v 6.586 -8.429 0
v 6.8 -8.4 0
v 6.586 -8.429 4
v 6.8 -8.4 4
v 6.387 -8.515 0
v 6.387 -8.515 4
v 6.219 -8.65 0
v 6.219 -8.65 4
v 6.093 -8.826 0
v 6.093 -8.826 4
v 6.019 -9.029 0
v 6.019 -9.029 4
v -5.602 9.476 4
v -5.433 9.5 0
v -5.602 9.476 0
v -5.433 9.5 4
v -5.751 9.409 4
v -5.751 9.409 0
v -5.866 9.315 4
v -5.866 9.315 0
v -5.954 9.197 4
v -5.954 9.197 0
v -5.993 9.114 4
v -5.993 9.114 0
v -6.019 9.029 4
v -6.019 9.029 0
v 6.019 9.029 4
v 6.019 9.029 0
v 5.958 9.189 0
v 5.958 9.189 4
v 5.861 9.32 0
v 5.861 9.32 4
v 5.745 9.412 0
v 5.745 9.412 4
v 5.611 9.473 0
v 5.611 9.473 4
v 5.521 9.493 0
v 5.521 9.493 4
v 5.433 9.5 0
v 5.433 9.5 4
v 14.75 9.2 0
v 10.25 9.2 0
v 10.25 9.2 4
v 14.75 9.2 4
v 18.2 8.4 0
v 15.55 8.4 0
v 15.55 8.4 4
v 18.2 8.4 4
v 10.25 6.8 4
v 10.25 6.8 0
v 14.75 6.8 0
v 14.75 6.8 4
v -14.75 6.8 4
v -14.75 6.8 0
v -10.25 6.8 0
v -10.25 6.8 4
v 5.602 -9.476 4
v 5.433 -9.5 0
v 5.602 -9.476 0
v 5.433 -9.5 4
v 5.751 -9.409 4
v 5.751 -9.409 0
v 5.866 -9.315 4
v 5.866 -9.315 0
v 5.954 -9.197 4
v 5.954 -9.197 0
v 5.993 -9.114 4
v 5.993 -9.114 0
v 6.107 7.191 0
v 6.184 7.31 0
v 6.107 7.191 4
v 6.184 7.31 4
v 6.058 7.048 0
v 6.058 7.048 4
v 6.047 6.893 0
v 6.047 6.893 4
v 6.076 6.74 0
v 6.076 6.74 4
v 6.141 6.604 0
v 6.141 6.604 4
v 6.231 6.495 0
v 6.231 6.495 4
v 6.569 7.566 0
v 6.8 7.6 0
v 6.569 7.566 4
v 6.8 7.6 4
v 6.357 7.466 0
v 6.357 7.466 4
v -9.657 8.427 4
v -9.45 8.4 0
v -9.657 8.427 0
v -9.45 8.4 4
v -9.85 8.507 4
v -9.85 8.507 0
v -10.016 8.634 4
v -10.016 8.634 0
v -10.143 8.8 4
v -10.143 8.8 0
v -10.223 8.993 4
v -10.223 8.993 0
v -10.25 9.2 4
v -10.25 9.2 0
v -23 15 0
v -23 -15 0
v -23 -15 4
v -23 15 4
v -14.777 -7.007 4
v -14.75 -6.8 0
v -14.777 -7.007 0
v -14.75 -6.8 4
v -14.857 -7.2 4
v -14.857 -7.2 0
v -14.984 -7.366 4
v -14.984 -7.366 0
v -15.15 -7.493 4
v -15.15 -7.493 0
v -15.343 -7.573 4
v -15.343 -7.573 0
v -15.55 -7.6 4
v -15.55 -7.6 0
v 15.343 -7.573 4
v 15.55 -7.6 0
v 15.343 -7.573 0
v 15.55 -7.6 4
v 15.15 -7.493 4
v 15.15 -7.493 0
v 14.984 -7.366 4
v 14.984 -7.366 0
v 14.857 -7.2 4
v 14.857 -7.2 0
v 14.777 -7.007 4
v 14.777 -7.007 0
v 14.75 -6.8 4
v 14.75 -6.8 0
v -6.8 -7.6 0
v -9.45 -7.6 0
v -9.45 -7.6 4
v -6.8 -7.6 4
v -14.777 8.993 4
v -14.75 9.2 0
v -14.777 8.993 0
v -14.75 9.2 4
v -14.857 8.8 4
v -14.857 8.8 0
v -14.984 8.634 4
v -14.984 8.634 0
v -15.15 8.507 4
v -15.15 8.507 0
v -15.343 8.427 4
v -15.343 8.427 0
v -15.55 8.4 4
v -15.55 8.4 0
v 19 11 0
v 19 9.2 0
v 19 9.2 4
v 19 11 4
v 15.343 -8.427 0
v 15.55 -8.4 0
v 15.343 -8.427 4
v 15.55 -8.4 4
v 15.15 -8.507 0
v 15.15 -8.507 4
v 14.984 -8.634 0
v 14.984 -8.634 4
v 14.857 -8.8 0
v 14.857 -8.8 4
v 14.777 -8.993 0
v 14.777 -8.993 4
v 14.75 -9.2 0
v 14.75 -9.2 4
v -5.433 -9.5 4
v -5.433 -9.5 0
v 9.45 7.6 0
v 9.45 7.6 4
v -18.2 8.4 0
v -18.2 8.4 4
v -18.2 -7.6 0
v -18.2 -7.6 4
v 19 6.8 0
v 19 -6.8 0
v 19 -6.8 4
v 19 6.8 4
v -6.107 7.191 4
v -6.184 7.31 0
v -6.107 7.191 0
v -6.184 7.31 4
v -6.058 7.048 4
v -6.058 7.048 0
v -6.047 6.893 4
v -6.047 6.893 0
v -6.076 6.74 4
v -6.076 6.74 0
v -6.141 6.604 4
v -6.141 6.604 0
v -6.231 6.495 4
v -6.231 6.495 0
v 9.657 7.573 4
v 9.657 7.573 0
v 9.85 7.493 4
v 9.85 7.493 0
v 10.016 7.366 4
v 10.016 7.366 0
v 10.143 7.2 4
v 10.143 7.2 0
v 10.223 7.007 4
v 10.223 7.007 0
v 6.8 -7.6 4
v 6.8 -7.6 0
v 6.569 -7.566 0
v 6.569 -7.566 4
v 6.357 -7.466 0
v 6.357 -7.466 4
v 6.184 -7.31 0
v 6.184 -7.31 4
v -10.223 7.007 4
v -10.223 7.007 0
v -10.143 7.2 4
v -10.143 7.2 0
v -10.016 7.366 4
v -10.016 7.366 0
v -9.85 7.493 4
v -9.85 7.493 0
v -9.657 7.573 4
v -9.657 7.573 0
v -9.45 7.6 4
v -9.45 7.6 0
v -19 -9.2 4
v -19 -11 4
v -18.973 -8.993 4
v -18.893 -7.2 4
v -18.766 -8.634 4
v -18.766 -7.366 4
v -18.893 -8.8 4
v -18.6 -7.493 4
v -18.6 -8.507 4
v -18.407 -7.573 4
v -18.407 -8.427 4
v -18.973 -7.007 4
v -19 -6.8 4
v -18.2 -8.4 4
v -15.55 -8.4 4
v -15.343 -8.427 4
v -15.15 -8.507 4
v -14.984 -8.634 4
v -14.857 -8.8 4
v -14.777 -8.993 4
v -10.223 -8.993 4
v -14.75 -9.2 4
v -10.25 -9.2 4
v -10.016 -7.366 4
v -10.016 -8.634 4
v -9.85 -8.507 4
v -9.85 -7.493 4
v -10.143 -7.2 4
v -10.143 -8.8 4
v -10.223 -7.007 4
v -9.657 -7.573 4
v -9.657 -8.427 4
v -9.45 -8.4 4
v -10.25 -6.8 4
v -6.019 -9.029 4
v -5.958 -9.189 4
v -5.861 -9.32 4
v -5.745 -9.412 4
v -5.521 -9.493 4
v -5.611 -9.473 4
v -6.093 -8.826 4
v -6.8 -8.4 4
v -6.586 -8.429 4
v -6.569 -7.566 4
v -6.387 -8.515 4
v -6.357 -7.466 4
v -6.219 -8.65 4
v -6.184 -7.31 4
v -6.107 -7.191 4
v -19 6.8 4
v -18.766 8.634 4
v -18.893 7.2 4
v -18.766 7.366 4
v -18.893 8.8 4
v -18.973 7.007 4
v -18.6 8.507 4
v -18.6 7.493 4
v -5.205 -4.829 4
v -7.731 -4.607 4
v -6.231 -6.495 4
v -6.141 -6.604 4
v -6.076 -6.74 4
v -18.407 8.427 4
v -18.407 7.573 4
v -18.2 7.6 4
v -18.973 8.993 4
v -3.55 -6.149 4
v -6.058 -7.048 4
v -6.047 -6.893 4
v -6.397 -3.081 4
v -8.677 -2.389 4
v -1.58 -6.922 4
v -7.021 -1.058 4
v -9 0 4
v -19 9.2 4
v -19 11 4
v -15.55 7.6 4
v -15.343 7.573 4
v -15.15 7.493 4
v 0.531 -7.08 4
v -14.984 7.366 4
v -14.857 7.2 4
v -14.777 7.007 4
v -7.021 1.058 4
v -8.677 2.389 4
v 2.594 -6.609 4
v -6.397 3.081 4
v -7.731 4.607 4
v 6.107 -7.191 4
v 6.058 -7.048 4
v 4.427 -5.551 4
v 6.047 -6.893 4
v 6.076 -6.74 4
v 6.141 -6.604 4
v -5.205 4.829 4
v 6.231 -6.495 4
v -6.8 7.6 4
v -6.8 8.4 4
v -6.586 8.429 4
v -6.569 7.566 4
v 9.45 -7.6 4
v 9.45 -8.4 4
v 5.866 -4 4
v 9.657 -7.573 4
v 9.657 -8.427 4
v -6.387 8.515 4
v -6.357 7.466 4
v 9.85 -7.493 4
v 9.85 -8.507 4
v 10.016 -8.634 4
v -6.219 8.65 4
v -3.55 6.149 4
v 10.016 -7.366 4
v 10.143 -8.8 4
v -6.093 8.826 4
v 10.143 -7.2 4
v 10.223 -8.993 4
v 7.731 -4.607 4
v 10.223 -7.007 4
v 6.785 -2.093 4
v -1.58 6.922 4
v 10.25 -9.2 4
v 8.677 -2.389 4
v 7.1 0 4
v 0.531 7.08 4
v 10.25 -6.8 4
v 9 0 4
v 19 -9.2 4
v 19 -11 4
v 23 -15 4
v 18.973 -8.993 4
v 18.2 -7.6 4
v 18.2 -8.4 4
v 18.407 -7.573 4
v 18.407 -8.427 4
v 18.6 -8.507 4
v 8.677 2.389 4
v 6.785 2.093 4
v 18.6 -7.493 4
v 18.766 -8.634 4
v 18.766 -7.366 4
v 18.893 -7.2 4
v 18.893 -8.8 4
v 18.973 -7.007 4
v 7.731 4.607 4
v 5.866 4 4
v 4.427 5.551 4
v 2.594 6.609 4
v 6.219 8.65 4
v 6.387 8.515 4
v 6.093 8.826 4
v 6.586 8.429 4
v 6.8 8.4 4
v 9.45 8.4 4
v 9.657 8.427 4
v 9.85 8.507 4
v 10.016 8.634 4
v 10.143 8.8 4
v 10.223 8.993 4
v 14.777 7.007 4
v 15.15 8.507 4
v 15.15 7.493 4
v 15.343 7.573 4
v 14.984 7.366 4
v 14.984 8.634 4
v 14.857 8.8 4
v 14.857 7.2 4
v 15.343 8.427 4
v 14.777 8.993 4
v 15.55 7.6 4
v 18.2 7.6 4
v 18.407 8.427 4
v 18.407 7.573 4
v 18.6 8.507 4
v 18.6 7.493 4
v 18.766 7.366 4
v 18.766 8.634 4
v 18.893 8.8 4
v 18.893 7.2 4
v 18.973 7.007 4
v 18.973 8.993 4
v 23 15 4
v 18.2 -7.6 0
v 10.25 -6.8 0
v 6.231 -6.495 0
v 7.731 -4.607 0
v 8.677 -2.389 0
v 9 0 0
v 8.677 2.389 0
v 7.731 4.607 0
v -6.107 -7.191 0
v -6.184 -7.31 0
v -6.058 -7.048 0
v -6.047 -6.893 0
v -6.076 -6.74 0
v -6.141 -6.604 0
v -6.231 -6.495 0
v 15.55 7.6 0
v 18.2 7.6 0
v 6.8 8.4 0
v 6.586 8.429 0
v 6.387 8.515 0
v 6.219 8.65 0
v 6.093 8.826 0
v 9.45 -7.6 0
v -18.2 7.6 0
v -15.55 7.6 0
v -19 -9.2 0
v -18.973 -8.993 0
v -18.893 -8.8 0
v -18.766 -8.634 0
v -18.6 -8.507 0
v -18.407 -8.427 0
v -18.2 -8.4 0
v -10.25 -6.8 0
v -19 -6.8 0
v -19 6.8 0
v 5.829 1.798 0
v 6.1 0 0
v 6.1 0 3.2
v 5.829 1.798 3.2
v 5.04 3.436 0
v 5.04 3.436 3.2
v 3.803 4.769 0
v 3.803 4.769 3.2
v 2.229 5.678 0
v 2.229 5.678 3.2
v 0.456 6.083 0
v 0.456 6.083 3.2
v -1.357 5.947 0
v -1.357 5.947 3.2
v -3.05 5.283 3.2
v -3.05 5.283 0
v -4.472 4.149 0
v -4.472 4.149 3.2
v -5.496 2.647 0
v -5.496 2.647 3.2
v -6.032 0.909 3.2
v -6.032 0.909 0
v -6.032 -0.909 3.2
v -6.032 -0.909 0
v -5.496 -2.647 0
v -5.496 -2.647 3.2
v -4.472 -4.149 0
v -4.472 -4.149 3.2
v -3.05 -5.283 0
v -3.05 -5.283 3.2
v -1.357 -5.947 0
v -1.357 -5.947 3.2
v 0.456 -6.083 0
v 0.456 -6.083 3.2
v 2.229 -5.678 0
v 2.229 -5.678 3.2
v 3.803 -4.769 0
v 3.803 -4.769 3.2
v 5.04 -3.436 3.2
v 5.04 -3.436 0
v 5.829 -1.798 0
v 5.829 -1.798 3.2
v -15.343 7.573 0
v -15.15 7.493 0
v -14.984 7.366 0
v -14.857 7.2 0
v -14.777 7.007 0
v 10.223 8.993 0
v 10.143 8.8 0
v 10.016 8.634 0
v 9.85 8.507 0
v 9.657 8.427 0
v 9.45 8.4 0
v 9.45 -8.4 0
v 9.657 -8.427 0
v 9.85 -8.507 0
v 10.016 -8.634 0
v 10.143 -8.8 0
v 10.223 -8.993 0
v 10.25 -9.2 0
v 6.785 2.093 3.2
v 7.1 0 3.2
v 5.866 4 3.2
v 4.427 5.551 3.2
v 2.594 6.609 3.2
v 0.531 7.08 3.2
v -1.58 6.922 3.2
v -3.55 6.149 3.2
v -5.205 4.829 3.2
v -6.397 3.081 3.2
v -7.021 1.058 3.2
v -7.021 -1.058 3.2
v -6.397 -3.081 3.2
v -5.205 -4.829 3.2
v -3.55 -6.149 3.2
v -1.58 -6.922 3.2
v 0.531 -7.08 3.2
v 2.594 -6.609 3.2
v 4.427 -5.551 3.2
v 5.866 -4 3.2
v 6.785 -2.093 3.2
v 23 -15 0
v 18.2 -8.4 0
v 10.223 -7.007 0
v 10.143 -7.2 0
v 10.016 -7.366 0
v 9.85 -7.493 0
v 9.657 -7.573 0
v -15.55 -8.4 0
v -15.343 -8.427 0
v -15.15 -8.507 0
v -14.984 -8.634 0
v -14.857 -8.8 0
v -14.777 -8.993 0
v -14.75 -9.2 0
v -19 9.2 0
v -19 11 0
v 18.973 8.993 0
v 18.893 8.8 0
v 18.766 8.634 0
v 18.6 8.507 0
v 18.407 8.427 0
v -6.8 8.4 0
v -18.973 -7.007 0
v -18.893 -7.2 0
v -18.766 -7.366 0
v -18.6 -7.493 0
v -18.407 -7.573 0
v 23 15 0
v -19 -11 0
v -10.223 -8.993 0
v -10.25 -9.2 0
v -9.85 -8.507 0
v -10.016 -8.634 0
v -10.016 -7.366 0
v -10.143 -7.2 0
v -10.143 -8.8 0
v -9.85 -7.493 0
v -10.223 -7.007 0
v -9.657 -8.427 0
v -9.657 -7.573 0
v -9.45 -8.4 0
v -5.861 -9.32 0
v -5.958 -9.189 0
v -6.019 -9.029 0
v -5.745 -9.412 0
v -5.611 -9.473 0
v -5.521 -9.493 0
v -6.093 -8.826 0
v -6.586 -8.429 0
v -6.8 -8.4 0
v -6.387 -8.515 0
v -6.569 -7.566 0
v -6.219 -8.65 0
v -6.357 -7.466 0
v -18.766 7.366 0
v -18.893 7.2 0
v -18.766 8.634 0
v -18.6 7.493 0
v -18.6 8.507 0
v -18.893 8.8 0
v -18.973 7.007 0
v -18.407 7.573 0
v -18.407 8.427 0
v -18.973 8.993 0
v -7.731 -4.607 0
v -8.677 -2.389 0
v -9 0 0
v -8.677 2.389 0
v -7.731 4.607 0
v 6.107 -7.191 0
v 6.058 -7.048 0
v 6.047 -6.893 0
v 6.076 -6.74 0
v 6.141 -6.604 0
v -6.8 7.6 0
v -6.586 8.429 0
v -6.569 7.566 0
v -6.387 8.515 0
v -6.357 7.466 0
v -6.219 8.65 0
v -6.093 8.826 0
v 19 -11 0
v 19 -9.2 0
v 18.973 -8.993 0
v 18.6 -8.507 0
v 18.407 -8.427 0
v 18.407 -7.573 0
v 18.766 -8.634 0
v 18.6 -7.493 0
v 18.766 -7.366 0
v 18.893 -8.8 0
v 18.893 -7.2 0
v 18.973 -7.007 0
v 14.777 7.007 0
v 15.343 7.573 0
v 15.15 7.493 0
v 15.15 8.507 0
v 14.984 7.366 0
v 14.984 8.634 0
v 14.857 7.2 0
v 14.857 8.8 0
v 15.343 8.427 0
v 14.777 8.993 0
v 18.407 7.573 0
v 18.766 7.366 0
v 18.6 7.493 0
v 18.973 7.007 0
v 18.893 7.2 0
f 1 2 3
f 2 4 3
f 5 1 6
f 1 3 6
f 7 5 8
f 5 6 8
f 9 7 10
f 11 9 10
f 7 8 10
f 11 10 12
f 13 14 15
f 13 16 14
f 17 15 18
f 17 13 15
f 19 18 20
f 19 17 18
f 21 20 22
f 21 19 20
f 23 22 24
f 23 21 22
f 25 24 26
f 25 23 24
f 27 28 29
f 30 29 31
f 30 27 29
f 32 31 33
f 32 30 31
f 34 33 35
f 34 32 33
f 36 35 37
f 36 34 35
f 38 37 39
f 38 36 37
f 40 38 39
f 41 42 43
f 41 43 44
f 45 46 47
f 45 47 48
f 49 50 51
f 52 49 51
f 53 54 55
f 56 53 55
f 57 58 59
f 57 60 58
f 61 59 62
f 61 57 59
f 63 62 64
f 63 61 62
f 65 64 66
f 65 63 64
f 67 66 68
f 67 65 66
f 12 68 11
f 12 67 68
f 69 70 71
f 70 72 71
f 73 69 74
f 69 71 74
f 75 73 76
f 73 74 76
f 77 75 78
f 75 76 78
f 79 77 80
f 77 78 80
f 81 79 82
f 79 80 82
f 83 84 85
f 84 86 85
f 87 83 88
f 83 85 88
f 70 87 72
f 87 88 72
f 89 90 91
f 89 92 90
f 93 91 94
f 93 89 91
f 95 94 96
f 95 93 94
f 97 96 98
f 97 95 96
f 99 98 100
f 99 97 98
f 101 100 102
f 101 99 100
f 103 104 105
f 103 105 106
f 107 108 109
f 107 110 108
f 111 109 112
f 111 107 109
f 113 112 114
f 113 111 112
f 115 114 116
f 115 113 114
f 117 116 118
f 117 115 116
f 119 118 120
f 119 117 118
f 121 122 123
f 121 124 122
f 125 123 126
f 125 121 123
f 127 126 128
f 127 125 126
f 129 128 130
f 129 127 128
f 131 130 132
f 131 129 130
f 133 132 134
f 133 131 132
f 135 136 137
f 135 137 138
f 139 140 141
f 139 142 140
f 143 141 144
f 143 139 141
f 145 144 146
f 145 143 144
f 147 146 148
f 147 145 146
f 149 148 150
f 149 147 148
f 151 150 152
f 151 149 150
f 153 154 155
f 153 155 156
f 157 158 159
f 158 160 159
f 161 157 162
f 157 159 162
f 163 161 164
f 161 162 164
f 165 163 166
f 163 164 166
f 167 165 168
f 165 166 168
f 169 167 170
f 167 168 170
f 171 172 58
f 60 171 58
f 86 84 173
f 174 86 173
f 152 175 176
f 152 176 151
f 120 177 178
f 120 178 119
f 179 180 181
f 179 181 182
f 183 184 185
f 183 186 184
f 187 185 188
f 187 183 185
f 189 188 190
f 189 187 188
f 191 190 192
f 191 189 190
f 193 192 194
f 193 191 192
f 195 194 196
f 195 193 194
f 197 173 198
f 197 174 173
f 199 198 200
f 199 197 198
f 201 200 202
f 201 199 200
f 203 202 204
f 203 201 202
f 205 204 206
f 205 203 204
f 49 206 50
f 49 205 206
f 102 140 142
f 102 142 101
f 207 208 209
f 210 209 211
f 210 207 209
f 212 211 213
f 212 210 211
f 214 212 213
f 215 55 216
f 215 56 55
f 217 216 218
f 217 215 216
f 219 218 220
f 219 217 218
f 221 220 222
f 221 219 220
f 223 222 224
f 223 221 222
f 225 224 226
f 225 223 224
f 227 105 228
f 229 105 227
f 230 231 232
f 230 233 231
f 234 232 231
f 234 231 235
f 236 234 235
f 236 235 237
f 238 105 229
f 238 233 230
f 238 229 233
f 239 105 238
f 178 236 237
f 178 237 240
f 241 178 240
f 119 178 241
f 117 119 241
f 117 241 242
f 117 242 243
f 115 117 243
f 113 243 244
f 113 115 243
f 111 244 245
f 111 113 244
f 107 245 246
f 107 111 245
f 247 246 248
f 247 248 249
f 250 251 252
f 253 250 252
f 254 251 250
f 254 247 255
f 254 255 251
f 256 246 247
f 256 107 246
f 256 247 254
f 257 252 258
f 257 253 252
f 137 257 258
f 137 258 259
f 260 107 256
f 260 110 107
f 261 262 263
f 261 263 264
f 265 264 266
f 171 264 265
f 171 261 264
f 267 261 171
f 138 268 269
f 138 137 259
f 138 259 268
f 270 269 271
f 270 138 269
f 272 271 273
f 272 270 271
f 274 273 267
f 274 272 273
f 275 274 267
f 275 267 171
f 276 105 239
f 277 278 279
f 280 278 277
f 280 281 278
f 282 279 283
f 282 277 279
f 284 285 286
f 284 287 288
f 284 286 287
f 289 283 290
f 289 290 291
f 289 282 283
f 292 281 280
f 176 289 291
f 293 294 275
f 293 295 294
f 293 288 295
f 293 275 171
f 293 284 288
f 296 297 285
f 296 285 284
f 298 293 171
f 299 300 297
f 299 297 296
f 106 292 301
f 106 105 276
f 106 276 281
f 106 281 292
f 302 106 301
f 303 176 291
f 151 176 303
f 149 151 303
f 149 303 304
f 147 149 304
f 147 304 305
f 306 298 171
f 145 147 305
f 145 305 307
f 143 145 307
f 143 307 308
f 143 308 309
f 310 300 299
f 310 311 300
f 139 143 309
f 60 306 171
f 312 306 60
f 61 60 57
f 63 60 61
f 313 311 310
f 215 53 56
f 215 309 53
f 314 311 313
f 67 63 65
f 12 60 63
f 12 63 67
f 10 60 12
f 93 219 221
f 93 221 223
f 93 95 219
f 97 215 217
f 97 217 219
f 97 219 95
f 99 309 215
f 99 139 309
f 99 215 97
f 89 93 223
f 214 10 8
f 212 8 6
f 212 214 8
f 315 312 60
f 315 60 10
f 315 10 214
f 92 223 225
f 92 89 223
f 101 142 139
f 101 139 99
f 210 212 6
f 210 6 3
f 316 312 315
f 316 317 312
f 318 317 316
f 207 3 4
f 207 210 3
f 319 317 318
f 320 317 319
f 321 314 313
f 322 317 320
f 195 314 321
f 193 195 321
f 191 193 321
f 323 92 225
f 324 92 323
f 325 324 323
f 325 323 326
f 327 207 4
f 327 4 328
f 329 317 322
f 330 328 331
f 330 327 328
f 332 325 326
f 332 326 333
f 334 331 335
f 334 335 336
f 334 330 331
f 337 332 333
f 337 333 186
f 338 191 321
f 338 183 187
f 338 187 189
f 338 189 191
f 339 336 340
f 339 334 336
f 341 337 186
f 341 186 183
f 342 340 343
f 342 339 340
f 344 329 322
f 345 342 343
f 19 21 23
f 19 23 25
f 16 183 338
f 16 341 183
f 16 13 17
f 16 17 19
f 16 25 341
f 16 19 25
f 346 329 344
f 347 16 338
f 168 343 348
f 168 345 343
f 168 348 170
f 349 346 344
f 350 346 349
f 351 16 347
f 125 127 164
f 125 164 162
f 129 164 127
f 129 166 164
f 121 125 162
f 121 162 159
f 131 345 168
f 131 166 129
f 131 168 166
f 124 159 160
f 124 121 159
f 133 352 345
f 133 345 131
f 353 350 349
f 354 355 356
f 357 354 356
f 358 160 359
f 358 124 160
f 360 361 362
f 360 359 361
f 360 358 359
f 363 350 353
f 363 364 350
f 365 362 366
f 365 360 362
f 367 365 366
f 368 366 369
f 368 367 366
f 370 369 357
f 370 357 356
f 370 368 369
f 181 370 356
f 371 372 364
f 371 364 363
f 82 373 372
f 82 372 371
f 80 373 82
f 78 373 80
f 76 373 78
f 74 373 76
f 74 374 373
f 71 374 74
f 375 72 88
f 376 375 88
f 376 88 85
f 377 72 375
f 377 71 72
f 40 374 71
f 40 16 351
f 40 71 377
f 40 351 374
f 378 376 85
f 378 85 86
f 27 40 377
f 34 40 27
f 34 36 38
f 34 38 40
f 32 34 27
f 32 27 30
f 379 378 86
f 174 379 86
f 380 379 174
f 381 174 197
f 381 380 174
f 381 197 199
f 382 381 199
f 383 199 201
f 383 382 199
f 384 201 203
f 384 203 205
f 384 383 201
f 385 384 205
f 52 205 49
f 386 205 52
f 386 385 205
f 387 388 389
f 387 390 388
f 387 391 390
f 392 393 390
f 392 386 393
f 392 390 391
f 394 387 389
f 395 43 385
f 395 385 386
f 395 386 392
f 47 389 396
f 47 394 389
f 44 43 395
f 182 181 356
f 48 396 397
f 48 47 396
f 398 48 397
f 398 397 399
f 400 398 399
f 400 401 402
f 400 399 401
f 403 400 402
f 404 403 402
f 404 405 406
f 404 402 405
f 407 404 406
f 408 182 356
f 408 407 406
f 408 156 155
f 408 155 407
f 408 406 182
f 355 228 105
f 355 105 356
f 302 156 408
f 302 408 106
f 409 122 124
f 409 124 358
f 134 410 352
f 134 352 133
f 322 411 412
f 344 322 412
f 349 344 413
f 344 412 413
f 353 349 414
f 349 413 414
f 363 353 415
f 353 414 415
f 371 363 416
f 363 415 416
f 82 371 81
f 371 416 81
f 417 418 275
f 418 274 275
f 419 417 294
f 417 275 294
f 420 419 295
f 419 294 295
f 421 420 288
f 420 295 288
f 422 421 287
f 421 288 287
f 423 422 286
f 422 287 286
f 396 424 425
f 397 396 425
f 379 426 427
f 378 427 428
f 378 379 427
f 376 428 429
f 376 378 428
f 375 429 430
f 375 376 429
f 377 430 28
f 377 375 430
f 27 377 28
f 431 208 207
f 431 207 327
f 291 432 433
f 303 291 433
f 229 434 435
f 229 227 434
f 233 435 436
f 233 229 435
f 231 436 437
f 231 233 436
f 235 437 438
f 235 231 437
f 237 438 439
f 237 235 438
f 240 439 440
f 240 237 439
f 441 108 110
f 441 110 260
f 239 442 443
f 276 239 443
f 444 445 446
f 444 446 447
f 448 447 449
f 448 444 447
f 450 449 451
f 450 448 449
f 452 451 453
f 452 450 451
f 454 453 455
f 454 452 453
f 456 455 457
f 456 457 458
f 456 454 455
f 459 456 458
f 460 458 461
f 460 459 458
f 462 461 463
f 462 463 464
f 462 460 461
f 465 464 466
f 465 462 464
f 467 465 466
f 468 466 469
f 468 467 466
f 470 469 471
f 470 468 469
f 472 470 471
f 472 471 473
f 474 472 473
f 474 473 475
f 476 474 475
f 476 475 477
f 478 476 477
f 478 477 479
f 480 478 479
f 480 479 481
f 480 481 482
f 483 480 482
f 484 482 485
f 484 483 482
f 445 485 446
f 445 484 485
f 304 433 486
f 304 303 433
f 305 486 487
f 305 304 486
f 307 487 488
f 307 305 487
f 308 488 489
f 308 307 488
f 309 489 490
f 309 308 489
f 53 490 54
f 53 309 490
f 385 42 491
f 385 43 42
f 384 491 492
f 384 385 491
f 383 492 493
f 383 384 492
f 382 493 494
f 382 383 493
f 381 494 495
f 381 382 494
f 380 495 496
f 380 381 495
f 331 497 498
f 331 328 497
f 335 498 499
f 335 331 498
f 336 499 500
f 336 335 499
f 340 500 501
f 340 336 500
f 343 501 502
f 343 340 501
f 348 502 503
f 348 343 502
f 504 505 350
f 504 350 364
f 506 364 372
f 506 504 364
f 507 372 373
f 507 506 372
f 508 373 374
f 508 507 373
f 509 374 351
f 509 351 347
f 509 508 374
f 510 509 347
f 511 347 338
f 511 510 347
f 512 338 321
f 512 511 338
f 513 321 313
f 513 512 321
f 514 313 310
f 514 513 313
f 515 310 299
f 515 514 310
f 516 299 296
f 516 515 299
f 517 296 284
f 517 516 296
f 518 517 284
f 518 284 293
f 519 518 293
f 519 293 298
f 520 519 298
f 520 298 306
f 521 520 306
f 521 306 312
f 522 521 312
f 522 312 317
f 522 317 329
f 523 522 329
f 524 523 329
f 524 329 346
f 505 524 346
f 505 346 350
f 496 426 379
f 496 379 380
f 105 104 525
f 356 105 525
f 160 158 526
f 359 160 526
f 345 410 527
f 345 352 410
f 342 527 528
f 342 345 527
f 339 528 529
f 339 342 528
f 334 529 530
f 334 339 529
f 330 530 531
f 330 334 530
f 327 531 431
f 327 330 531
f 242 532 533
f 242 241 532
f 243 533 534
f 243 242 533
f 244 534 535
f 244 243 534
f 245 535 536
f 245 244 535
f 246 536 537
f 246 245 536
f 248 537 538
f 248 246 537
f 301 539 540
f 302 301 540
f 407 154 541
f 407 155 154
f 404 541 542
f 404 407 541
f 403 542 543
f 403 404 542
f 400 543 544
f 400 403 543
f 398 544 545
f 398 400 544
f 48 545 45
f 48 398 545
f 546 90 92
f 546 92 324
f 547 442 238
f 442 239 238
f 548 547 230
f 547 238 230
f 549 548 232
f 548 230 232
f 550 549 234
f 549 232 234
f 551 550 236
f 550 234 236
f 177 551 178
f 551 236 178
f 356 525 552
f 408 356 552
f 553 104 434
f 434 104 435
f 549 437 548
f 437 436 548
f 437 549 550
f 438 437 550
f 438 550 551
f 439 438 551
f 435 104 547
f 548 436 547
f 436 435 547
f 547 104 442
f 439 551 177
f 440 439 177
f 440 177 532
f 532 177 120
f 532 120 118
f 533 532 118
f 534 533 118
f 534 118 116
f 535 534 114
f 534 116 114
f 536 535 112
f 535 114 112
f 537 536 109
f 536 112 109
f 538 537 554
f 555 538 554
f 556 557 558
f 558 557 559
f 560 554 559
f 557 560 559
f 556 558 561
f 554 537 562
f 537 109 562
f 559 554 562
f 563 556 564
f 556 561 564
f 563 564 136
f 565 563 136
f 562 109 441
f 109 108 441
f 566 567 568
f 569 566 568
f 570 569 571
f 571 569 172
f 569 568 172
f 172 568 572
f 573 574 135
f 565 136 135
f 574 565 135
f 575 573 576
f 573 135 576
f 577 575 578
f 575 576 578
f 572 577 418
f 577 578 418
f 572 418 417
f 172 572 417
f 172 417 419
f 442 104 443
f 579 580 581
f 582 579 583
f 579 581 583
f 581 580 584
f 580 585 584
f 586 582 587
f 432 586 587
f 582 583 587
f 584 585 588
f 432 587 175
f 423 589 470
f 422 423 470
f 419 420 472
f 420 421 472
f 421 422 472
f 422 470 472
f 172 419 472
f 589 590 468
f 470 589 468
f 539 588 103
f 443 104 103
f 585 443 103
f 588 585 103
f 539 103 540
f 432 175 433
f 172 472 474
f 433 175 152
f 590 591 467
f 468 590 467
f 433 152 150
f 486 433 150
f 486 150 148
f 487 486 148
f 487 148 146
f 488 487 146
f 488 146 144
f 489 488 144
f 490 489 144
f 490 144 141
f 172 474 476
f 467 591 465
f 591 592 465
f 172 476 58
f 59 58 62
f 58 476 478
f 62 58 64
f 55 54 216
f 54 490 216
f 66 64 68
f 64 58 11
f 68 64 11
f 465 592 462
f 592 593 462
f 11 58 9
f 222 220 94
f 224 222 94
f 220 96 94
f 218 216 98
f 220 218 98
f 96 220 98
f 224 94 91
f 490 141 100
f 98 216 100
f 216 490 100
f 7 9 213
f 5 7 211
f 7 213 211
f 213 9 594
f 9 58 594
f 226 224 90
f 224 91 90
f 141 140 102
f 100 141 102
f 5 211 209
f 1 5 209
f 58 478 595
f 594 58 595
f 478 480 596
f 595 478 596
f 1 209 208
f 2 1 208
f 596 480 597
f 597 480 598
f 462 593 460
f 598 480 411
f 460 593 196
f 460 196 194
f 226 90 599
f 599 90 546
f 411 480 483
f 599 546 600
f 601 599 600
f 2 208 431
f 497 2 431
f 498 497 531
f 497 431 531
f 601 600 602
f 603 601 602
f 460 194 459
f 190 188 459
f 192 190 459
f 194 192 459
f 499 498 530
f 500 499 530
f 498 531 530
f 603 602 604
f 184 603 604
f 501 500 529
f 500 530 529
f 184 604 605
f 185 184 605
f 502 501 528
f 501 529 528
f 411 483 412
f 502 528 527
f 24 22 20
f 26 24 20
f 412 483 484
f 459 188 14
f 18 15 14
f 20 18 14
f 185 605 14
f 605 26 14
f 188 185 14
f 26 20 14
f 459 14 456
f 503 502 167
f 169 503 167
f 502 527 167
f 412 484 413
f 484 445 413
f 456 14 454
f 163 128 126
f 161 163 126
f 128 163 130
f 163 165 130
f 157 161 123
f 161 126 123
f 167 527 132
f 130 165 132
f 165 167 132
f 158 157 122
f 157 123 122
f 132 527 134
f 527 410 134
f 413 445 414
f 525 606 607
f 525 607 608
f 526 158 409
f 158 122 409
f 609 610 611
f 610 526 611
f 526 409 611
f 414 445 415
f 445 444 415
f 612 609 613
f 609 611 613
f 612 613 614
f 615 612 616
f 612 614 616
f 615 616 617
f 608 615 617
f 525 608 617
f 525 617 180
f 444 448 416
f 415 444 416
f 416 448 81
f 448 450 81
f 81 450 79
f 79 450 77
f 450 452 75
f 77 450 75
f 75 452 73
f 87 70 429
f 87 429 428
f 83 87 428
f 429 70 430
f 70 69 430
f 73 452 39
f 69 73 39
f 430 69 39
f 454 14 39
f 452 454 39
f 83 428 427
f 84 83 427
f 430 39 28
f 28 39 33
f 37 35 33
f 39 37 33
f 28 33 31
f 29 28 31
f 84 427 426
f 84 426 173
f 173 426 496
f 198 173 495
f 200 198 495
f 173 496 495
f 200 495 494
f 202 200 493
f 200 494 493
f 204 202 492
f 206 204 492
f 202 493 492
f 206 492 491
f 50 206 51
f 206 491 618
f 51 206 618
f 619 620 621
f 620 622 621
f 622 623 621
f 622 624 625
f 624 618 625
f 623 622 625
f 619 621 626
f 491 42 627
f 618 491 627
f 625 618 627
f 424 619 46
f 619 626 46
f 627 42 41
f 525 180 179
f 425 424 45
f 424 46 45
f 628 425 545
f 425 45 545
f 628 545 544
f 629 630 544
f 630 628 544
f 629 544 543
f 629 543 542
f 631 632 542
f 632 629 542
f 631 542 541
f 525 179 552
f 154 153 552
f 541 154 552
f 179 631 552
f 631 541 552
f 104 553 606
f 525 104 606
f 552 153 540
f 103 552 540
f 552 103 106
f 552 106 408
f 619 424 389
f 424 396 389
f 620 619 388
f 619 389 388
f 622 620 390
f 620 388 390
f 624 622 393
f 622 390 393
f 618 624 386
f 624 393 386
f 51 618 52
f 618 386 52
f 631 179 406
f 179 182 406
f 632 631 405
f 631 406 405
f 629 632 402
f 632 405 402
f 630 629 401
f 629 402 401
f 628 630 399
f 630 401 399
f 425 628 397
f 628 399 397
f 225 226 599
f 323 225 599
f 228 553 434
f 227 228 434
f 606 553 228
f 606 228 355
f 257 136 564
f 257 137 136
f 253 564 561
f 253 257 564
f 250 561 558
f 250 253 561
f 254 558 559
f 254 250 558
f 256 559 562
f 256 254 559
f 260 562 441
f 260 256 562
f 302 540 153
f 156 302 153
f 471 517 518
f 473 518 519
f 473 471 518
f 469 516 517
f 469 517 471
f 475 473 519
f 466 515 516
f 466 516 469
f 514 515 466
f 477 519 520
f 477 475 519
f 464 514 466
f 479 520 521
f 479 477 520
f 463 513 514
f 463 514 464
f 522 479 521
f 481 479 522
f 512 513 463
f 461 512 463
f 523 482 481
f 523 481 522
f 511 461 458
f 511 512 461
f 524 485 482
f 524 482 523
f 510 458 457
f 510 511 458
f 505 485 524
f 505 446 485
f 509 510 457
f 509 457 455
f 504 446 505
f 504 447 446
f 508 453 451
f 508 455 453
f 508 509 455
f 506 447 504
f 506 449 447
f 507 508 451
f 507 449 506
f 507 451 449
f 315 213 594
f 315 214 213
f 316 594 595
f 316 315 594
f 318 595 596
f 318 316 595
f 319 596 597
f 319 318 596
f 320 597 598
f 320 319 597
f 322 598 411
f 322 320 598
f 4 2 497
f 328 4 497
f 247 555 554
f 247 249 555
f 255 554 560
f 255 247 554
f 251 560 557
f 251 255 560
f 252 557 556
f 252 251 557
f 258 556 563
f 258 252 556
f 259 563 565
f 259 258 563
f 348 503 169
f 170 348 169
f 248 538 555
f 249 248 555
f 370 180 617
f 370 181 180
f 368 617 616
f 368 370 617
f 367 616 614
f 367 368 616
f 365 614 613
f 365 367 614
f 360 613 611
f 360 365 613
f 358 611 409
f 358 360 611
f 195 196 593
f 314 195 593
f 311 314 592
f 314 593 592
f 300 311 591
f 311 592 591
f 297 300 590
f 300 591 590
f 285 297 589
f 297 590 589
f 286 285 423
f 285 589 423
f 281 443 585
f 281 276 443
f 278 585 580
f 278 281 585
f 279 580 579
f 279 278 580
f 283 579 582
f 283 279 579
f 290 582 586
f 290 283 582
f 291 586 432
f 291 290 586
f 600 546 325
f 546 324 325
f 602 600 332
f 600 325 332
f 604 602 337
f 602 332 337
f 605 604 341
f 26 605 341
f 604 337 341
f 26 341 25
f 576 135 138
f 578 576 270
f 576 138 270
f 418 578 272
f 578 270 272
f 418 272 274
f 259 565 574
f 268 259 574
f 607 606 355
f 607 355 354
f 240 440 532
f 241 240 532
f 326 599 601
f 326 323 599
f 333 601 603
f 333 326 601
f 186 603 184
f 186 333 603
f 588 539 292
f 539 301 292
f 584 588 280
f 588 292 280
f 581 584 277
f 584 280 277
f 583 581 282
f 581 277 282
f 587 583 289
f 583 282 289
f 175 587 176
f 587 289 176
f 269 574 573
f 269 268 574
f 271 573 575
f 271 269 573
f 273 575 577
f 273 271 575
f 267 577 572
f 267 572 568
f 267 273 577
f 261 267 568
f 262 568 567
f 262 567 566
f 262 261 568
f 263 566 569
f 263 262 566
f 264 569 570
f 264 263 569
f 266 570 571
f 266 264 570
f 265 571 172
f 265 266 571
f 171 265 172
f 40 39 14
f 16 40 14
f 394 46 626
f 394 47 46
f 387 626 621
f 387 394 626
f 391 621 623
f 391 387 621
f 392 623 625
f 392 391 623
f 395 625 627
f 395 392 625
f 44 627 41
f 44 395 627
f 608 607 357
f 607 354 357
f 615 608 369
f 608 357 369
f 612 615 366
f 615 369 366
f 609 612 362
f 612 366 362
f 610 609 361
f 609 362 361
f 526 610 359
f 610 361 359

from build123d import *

# Parameters (mm, degrees)
SKETCH_2_R      = 7.1
SKETCH_2_R_2    = 6.1
EXTRUDE_1_DEPTH = 3.2
SKETCH_2_3_R    = 9
SKETCH_2_3_R_2  = 7.1
EXTRUDE_2_DEPTH = 4
EXTRUDE_3_DEPTH = 4
SKETCH_4_W      = 46
SKETCH_4_H      = 30
SKETCH_4_W_2    = 38
SKETCH_4_H_2    = 22
EXTRUDE_4_DEPTH = 4
SKETCH_5_W      = 13
SKETCH_5_H      = 0.8
SKETCH_5_W_2    = 4.5
SKETCH_5_H_2    = 2.4
EXTRUDE_5_DEPTH = 4
FILLET_1_R      = 0.8
FILLET_2_R      = 0.6


with BuildPart() as part:
    # 草图2 → 凸台-拉伸1 (new body)
    with BuildSketch(Plane.XY):
        Circle(SKETCH_2_R)
        Circle(SKETCH_2_R_2, mode=Mode.SUBTRACT)
    extrude(amount=EXTRUDE_1_DEPTH)

    # 草图2<3> → 凸台-拉伸2 (add)
    with BuildSketch(Plane.XY):
        Circle(SKETCH_2_3_R)
        Circle(SKETCH_2_3_R_2, mode=Mode.SUBTRACT)
    extrude(amount=EXTRUDE_2_DEPTH)

    # 草图3 → 凸台-拉伸3 (add)
    with BuildSketch(Plane.XY):
        with BuildLine():
            Line((6, 6.708203932), (6, 9.5))
            Line((6, 9.5), (-6, 9.5))
            Line((-6, 9.5), (-6, 6.708203932))
            ThreePointArc((-6, 6.708203932), (0, 9), (6, 6.708203932))
        make_face()
        with BuildLine():
            Line((-6, -9.5), (6, -9.5))
            Line((6, -9.5), (6, -6.708203932))
            ThreePointArc((6, -6.708203932), (0, -9), (-6, -6.708203932))
            Line((-6, -6.708203932), (-6, -9.5))
        make_face()
    extrude(amount=EXTRUDE_3_DEPTH)



with BuildPart() as body_2:
    # 草图4 → 凸台-拉伸4 (new body)
    with BuildSketch(Plane.XY):
        Rectangle(SKETCH_4_W, SKETCH_4_H)
        Rectangle(SKETCH_4_W_2, SKETCH_4_H_2, mode=Mode.SUBTRACT)
    extrude(amount=EXTRUDE_4_DEPTH)


with BuildPart() as part_1:
    add(part.part)

    add(body_2.part)  # 凸台-拉伸5 merges body 2
    # 草图5 → 凸台-拉伸5 (add)
    with BuildSketch(Plane.XY):
        with Locations((-12.5, 8)):
            Rectangle(SKETCH_5_W, SKETCH_5_H)
        with Locations((12.5, 8)):
            Rectangle(SKETCH_5_W, SKETCH_5_H)
        with Locations((-12.5, -8)):
            Rectangle(SKETCH_5_W, SKETCH_5_H)
        with Locations((12.5, -8)):
            Rectangle(SKETCH_5_W, SKETCH_5_H)
        with Locations((12.5, 8)):
            Rectangle(SKETCH_5_W_2, SKETCH_5_H_2)
        with Locations((-12.5, 8)):
            Rectangle(SKETCH_5_W_2, SKETCH_5_H_2)
        with Locations((12.5, -8)):
            Rectangle(SKETCH_5_W_2, SKETCH_5_H_2)
        with Locations((-12.5, -8)):
            Rectangle(SKETCH_5_W_2, SKETCH_5_H_2)
    extrude(amount=EXTRUDE_5_DEPTH)

    # 圆角1
    fillet_1_edges = [part_1.edges().sort_by_distance(p)[0] for p in [
        (19, 7.6, 2),
        (19, -7.6, 2),
        (-19, -7.6, 2),
        (-19, 7.6, 2),
        (-6, 7.6, 2),
        (6, 7.6, 2),
        (6, -7.6, 2),
        (-6, -7.6, 2),
        (-6, -8.4, 2),
        (6, -8.4, 2),
        (6, 8.4, 2),
        (-6, 8.4, 2),
        (-19, 8.4, 2),
        (19, 8.4, 2),
        (-19, -8.4, 2),
        (19, -8.4, 2),
        (-10.25, 7.6, 2),
        (-10.25, 8.4, 2),
        (-14.75, 8.4, 2),
        (-14.75, 7.6, 2),
        (14.75, 7.6, 2),
        (14.75, 8.4, 2),
        (10.25, 8.4, 2),
        (10.25, 7.6, 2),
        (14.75, -8.4, 2),
        (14.75, -7.6, 2),
        (10.25, -7.6, 2),
        (10.25, -8.4, 2),
        (-10.25, -8.4, 2),
        (-10.25, -7.6, 2),
        (-14.75, -7.6, 2),
        (-14.75, -8.4, 2),
    ]]
    fillet(fillet_1_edges, radius=FILLET_1_R - 0.0001)  # a hair under: the kernel refuses the full size

    # 圆角2
    fillet_2_edges = [part_1.edges().sort_by_distance(p)[0] for p in [
        (-6, -9.5, 2),
        (6, 9.5, 2),
        (6, -9.5, 2),
        (-6, 9.5, 2),
        (6, -6.708203932, 2),
        (-6, 6.708203932, 2),
        (6, 6.708203932, 2),
        (-6, -6.708203932, 2),
    ]]
    fillet(fillet_2_edges, radius=FILLET_2_R)


solid = part_1.part
